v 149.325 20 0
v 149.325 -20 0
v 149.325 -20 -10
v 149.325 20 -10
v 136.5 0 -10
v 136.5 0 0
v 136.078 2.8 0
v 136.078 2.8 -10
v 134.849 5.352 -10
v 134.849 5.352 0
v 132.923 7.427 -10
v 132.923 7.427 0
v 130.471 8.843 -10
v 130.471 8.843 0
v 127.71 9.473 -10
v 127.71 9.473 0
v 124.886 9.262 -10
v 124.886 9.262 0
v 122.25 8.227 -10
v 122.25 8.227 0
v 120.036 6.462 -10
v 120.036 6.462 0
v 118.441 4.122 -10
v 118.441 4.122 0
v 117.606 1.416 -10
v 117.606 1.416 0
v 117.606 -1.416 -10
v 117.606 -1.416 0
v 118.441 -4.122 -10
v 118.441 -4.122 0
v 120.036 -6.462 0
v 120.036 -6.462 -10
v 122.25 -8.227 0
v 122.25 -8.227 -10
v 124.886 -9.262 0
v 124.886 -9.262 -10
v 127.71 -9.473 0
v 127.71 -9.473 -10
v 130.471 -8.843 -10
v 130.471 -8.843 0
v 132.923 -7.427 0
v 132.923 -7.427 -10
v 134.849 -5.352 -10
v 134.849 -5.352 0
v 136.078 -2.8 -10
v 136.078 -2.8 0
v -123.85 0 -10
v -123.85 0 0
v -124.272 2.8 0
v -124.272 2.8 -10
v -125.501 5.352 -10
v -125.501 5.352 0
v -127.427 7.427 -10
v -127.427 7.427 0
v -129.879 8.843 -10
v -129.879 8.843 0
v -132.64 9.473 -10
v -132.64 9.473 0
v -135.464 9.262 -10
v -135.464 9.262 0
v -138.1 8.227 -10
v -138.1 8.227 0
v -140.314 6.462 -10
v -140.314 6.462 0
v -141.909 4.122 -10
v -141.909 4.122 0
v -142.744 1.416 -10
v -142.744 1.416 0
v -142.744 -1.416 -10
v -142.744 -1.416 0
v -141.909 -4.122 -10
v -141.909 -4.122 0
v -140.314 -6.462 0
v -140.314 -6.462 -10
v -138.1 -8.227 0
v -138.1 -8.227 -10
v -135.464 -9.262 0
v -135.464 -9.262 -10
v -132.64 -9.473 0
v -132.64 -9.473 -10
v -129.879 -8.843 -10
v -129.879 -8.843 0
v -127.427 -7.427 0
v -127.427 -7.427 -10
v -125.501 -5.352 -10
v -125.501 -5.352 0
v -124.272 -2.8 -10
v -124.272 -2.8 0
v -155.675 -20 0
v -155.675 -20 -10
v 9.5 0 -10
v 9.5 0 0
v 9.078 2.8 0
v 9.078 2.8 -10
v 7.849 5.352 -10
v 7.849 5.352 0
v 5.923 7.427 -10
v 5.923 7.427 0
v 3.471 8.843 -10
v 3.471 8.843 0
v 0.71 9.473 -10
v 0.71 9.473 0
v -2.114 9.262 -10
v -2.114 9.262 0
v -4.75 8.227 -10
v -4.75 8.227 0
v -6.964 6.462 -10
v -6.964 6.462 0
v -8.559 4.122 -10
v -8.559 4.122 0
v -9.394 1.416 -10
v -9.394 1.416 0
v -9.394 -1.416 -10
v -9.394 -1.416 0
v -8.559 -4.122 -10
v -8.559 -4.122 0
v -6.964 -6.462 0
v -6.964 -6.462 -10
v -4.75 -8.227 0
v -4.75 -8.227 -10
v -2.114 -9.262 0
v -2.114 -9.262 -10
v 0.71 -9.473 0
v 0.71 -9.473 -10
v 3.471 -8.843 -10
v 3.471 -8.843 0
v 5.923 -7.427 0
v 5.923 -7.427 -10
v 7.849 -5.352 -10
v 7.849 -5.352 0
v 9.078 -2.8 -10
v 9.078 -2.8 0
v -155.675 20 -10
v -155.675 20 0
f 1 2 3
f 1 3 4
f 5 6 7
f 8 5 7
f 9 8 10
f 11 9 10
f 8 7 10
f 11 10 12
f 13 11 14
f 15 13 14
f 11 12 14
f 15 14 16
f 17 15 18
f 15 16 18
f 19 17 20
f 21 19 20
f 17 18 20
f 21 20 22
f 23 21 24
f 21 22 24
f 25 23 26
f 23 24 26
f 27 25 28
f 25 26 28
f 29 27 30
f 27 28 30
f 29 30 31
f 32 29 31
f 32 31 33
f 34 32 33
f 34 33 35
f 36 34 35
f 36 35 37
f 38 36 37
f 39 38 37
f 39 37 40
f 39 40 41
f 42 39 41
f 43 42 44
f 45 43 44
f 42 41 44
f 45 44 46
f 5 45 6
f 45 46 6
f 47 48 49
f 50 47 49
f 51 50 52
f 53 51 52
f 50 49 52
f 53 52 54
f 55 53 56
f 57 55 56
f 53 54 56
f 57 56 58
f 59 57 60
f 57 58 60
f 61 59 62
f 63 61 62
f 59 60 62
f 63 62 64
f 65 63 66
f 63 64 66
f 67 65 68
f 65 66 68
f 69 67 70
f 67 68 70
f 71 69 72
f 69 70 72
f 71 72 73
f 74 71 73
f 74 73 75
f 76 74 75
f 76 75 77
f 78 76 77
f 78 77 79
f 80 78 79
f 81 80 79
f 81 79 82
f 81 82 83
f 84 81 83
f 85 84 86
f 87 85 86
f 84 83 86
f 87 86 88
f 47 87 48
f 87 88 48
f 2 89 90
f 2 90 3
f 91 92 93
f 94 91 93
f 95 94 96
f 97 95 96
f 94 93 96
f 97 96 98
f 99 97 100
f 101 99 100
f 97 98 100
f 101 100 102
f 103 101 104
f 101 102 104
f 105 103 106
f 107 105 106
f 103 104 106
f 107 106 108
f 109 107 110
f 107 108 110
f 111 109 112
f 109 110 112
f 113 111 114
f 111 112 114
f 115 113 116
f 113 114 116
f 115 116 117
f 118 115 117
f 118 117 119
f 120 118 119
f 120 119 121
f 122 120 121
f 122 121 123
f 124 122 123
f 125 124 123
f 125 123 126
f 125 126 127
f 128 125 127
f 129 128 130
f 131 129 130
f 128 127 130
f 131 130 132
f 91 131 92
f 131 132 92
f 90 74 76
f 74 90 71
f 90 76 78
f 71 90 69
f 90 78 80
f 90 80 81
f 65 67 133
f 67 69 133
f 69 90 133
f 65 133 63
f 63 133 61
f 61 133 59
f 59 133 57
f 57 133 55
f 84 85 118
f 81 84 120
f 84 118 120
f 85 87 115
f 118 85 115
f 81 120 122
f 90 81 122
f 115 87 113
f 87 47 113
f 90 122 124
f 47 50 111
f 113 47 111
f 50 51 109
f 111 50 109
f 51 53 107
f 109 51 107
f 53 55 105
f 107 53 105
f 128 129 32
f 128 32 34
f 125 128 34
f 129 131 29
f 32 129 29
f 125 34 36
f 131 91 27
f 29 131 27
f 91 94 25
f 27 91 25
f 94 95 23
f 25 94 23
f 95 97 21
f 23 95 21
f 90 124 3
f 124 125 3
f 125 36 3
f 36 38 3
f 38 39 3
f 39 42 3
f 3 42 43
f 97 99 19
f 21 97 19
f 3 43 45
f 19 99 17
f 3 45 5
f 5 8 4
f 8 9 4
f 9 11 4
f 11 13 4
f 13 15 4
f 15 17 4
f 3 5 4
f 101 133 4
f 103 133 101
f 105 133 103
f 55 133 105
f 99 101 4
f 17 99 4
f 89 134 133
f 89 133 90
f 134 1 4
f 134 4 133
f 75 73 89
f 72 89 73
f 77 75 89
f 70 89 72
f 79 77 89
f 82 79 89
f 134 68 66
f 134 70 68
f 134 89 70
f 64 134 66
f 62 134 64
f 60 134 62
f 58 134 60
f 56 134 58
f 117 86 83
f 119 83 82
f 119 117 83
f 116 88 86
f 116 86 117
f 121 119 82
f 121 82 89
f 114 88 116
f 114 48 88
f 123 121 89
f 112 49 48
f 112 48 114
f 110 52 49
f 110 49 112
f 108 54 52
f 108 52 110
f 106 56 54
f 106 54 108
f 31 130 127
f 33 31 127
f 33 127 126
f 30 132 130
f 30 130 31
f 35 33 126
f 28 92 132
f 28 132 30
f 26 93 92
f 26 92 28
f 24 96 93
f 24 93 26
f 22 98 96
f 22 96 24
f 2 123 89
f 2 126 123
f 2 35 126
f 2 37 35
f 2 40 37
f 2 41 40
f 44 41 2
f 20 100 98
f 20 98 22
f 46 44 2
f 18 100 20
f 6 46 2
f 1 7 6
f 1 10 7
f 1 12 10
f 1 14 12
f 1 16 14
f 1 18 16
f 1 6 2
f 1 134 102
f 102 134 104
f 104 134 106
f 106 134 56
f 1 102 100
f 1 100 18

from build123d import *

# Parameters (mm, degrees)
F0_R     = 9.5
F1_DEPTH = 10


with BuildPart() as f1:
    # F0 (on Top) → F1 (new body)
    with BuildSketch(Plane.XY):
        Polygon((-155.675, -20), (0, -20), (149.325, -20), (149.325, 20), (0, 20), (-155.675, 20), align=None)
        with Locations((-133.35, 0)):
            Circle(F0_R, mode=Mode.SUBTRACT)
        Circle(F0_R, mode=Mode.SUBTRACT)
        with Locations((127, 0)):
            Circle(F0_R, mode=Mode.SUBTRACT)
    extrude(amount=-F1_DEPTH)


solid = f1.part
